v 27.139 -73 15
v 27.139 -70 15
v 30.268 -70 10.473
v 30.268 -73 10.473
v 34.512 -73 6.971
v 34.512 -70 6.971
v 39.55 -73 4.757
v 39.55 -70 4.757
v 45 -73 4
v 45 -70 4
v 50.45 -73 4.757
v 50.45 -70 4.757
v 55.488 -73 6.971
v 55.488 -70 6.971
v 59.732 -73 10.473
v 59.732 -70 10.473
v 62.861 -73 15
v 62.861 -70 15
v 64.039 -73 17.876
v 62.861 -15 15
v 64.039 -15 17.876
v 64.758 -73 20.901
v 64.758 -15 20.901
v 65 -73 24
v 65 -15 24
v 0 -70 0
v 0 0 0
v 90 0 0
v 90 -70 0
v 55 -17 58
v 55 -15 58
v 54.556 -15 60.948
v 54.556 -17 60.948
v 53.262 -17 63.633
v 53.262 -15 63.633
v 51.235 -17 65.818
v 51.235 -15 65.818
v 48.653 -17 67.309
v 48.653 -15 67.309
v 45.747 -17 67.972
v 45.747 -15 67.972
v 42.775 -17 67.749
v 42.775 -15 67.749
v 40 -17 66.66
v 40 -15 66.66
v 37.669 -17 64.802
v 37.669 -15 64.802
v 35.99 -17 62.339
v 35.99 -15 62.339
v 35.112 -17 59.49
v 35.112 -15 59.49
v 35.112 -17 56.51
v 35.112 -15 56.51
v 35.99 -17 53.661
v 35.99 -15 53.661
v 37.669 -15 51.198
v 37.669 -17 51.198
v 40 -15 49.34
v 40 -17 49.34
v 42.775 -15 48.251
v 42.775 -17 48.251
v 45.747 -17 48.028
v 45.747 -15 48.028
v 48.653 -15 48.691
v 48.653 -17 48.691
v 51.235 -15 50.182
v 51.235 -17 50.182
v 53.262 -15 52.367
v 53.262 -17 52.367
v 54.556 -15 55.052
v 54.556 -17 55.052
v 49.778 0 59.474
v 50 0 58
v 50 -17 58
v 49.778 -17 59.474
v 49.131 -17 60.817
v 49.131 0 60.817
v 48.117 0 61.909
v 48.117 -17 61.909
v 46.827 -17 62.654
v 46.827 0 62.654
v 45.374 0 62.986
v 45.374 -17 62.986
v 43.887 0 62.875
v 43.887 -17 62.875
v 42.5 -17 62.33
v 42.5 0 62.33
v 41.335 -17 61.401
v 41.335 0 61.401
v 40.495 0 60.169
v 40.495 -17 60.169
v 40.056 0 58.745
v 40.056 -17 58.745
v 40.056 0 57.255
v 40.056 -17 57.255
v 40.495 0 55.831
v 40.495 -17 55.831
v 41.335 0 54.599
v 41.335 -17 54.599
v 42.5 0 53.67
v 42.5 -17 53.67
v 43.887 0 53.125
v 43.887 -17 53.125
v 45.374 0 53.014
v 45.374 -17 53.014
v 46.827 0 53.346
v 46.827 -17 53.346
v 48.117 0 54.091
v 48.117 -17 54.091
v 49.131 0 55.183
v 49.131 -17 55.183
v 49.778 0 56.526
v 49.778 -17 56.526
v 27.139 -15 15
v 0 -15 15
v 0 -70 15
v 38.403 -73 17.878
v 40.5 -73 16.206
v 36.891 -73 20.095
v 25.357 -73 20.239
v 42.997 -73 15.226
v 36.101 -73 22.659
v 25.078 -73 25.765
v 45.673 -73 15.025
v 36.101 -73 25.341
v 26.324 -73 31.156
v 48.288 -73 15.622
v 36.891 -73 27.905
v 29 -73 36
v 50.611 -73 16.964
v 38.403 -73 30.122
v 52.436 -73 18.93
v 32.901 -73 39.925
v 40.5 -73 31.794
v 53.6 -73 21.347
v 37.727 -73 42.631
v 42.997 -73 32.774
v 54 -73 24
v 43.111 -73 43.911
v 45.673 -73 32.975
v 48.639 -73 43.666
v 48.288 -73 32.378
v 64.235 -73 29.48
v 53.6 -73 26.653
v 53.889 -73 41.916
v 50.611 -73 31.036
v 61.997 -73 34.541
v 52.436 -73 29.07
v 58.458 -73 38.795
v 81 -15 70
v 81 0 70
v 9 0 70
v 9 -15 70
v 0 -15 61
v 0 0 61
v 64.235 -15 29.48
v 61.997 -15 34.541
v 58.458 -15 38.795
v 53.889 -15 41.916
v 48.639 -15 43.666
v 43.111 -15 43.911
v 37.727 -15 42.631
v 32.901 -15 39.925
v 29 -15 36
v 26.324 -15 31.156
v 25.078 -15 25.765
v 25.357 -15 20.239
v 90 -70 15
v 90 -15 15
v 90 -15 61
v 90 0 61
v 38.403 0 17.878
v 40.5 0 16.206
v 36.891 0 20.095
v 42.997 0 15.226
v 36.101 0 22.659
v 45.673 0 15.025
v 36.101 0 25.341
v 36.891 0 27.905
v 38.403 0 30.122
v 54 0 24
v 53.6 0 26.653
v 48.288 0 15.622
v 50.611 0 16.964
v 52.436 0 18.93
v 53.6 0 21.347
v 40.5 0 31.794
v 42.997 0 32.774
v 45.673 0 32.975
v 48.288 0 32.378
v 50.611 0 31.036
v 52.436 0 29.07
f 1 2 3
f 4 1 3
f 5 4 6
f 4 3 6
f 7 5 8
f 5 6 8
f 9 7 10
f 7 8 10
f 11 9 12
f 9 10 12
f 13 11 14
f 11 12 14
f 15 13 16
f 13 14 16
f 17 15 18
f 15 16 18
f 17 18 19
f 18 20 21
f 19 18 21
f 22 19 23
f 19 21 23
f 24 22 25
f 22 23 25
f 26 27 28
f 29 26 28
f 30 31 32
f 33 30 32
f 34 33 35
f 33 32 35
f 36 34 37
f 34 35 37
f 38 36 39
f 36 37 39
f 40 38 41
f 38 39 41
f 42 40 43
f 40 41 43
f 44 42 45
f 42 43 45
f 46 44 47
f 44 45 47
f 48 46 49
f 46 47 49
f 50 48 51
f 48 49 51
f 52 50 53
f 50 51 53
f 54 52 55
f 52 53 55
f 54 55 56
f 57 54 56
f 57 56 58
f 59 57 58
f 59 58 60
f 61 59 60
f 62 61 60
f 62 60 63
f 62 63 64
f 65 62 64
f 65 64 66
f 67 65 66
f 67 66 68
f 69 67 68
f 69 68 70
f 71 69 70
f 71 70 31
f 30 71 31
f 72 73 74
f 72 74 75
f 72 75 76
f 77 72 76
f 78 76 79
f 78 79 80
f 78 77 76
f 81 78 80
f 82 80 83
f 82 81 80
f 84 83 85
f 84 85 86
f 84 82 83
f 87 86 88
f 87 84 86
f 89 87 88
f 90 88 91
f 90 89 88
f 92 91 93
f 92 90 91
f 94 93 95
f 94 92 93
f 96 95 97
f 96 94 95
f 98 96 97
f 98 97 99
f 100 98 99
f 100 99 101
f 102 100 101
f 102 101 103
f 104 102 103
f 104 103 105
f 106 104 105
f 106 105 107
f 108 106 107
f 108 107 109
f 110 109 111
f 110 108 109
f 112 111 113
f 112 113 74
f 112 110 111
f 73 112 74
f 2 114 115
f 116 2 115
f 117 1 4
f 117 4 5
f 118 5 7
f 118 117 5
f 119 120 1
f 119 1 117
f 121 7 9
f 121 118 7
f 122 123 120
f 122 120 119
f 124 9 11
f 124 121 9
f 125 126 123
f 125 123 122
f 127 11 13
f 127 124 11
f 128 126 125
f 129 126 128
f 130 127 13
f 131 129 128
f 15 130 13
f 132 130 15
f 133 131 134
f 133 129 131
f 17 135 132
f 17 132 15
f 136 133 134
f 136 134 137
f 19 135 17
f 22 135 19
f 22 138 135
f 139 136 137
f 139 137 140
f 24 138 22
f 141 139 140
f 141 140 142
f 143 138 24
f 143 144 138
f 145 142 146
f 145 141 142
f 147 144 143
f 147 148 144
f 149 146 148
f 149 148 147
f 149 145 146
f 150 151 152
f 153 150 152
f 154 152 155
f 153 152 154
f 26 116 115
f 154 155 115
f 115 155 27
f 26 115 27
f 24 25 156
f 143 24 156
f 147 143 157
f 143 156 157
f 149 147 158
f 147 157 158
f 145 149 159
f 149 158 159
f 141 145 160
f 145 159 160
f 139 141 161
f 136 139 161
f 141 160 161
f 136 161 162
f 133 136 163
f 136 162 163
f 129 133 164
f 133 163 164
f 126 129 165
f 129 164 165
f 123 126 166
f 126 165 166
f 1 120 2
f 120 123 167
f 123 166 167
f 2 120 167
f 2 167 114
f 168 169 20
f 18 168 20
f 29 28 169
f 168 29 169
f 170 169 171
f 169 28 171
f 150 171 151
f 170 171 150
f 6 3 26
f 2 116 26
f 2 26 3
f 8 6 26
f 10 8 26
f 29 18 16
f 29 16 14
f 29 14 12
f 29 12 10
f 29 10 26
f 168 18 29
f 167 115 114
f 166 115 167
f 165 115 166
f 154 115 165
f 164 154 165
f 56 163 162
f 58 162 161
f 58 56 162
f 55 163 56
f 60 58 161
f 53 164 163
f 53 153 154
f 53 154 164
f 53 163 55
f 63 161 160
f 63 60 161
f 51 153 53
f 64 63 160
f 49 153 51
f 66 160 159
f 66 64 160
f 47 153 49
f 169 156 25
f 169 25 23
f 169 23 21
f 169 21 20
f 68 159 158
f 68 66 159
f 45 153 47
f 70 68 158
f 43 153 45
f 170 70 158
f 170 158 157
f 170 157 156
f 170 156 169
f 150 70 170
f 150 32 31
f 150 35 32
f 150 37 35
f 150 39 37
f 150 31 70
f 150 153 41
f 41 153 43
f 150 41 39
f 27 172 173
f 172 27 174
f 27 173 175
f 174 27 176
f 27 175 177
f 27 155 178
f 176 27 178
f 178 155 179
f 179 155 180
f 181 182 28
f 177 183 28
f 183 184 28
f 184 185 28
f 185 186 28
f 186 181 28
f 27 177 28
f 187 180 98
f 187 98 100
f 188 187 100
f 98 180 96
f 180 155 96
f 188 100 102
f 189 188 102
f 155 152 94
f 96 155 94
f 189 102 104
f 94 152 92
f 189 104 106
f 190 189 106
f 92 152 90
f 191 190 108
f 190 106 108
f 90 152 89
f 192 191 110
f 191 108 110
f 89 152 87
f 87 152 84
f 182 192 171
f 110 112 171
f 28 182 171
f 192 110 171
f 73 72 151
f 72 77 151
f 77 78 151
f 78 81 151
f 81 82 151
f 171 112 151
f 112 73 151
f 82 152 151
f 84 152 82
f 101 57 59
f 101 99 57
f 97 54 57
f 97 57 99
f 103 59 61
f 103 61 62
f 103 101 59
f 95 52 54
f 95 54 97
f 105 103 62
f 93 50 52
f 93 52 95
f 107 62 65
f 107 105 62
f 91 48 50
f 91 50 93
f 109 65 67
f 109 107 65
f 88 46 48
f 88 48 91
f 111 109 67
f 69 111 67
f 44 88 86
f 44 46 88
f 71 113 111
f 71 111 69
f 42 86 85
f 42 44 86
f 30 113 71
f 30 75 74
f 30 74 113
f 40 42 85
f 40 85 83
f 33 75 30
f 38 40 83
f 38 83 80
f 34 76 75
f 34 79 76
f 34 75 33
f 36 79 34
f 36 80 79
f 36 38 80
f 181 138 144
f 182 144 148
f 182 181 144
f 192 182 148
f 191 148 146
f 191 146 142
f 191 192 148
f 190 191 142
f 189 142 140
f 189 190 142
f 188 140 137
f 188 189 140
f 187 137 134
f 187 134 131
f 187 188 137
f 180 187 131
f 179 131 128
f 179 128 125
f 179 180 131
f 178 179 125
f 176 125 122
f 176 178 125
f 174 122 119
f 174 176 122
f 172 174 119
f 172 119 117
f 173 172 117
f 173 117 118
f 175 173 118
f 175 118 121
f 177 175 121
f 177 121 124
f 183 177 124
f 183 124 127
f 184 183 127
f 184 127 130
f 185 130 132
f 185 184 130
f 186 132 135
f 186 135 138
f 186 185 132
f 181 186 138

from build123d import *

# Parameters (mm, degrees)
F1_DEPTH = 70
F0_R     = 9
F2_DEPTH = 73
F0_R_2   = 10
F3_DEPTH = 15
F0_R_3   = 5
F4_DEPTH = 17
F5_SIZE2 = 9
F5_SIZE  = 9


with BuildPart() as f1:
    # F0 (on Front) → F1 (new body)
    with BuildSketch(Plane.XZ):
        with BuildLine():
            Line((0, 15), (0, 0))
            Line((0, 0), (90, 0))
            Line((90, 0), (90, 15))
            Line((90, 15), (62.860571, 15))
            ThreePointArc((62.860571, 15), (45, 4), (27.139429, 15))
            Line((27.139429, 15), (0, 15))
        make_face()
    extrude(amount=F1_DEPTH)

    # F0 (on Front) → F2 (join)
    with BuildSketch(Plane.XZ):
        with BuildLine():
            ThreePointArc((65, 24), (40.374604, 43.457793), (27.139429, 15))
            ThreePointArc((27.139429, 15), (45, 4), (62.860571, 15))
            ThreePointArc((62.860571, 15), (64.457793, 19.374604), (65, 24))
        make_face()
        with Locations((45, 24)):
            Circle(F0_R, mode=Mode.SUBTRACT)
    extrude(amount=F2_DEPTH)

    # F0 (on Front) → F3 (join)
    with BuildSketch(Plane.XZ):
        with BuildLine():
            Line((0, 70), (0, 15))
            Line((0, 15), (27.139429, 15))
            ThreePointArc((27.139429, 15), (40.374604, 43.457793), (65, 24))
            ThreePointArc((65, 24), (64.457793, 19.374604), (62.860571, 15))
            Line((62.860571, 15), (90, 15))
            Line((90, 15), (90, 70))
            Line((90, 70), (0, 70))
        make_face()
        with Locations((45, 58)):
            Circle(F0_R_2, mode=Mode.SUBTRACT)
    extrude(amount=F3_DEPTH)

    # F0 (on Front) → F4 (join)
    with BuildSketch(Plane.XZ):
        with Locations((45, 58)):
            Circle(F0_R_2)
        with Locations((45, 58)):
            Circle(F0_R_3, mode=Mode.SUBTRACT)
    extrude(amount=F4_DEPTH)

    # F5
    f5_edges = [f1.edges().sort_by_distance(p)[0] for p in [
        (0, -7.5, 70),
        (90, -7.5, 70),
    ]]
    chamfer(f5_edges, length=F5_SIZE, length2=F5_SIZE2)


solid = f1.part
